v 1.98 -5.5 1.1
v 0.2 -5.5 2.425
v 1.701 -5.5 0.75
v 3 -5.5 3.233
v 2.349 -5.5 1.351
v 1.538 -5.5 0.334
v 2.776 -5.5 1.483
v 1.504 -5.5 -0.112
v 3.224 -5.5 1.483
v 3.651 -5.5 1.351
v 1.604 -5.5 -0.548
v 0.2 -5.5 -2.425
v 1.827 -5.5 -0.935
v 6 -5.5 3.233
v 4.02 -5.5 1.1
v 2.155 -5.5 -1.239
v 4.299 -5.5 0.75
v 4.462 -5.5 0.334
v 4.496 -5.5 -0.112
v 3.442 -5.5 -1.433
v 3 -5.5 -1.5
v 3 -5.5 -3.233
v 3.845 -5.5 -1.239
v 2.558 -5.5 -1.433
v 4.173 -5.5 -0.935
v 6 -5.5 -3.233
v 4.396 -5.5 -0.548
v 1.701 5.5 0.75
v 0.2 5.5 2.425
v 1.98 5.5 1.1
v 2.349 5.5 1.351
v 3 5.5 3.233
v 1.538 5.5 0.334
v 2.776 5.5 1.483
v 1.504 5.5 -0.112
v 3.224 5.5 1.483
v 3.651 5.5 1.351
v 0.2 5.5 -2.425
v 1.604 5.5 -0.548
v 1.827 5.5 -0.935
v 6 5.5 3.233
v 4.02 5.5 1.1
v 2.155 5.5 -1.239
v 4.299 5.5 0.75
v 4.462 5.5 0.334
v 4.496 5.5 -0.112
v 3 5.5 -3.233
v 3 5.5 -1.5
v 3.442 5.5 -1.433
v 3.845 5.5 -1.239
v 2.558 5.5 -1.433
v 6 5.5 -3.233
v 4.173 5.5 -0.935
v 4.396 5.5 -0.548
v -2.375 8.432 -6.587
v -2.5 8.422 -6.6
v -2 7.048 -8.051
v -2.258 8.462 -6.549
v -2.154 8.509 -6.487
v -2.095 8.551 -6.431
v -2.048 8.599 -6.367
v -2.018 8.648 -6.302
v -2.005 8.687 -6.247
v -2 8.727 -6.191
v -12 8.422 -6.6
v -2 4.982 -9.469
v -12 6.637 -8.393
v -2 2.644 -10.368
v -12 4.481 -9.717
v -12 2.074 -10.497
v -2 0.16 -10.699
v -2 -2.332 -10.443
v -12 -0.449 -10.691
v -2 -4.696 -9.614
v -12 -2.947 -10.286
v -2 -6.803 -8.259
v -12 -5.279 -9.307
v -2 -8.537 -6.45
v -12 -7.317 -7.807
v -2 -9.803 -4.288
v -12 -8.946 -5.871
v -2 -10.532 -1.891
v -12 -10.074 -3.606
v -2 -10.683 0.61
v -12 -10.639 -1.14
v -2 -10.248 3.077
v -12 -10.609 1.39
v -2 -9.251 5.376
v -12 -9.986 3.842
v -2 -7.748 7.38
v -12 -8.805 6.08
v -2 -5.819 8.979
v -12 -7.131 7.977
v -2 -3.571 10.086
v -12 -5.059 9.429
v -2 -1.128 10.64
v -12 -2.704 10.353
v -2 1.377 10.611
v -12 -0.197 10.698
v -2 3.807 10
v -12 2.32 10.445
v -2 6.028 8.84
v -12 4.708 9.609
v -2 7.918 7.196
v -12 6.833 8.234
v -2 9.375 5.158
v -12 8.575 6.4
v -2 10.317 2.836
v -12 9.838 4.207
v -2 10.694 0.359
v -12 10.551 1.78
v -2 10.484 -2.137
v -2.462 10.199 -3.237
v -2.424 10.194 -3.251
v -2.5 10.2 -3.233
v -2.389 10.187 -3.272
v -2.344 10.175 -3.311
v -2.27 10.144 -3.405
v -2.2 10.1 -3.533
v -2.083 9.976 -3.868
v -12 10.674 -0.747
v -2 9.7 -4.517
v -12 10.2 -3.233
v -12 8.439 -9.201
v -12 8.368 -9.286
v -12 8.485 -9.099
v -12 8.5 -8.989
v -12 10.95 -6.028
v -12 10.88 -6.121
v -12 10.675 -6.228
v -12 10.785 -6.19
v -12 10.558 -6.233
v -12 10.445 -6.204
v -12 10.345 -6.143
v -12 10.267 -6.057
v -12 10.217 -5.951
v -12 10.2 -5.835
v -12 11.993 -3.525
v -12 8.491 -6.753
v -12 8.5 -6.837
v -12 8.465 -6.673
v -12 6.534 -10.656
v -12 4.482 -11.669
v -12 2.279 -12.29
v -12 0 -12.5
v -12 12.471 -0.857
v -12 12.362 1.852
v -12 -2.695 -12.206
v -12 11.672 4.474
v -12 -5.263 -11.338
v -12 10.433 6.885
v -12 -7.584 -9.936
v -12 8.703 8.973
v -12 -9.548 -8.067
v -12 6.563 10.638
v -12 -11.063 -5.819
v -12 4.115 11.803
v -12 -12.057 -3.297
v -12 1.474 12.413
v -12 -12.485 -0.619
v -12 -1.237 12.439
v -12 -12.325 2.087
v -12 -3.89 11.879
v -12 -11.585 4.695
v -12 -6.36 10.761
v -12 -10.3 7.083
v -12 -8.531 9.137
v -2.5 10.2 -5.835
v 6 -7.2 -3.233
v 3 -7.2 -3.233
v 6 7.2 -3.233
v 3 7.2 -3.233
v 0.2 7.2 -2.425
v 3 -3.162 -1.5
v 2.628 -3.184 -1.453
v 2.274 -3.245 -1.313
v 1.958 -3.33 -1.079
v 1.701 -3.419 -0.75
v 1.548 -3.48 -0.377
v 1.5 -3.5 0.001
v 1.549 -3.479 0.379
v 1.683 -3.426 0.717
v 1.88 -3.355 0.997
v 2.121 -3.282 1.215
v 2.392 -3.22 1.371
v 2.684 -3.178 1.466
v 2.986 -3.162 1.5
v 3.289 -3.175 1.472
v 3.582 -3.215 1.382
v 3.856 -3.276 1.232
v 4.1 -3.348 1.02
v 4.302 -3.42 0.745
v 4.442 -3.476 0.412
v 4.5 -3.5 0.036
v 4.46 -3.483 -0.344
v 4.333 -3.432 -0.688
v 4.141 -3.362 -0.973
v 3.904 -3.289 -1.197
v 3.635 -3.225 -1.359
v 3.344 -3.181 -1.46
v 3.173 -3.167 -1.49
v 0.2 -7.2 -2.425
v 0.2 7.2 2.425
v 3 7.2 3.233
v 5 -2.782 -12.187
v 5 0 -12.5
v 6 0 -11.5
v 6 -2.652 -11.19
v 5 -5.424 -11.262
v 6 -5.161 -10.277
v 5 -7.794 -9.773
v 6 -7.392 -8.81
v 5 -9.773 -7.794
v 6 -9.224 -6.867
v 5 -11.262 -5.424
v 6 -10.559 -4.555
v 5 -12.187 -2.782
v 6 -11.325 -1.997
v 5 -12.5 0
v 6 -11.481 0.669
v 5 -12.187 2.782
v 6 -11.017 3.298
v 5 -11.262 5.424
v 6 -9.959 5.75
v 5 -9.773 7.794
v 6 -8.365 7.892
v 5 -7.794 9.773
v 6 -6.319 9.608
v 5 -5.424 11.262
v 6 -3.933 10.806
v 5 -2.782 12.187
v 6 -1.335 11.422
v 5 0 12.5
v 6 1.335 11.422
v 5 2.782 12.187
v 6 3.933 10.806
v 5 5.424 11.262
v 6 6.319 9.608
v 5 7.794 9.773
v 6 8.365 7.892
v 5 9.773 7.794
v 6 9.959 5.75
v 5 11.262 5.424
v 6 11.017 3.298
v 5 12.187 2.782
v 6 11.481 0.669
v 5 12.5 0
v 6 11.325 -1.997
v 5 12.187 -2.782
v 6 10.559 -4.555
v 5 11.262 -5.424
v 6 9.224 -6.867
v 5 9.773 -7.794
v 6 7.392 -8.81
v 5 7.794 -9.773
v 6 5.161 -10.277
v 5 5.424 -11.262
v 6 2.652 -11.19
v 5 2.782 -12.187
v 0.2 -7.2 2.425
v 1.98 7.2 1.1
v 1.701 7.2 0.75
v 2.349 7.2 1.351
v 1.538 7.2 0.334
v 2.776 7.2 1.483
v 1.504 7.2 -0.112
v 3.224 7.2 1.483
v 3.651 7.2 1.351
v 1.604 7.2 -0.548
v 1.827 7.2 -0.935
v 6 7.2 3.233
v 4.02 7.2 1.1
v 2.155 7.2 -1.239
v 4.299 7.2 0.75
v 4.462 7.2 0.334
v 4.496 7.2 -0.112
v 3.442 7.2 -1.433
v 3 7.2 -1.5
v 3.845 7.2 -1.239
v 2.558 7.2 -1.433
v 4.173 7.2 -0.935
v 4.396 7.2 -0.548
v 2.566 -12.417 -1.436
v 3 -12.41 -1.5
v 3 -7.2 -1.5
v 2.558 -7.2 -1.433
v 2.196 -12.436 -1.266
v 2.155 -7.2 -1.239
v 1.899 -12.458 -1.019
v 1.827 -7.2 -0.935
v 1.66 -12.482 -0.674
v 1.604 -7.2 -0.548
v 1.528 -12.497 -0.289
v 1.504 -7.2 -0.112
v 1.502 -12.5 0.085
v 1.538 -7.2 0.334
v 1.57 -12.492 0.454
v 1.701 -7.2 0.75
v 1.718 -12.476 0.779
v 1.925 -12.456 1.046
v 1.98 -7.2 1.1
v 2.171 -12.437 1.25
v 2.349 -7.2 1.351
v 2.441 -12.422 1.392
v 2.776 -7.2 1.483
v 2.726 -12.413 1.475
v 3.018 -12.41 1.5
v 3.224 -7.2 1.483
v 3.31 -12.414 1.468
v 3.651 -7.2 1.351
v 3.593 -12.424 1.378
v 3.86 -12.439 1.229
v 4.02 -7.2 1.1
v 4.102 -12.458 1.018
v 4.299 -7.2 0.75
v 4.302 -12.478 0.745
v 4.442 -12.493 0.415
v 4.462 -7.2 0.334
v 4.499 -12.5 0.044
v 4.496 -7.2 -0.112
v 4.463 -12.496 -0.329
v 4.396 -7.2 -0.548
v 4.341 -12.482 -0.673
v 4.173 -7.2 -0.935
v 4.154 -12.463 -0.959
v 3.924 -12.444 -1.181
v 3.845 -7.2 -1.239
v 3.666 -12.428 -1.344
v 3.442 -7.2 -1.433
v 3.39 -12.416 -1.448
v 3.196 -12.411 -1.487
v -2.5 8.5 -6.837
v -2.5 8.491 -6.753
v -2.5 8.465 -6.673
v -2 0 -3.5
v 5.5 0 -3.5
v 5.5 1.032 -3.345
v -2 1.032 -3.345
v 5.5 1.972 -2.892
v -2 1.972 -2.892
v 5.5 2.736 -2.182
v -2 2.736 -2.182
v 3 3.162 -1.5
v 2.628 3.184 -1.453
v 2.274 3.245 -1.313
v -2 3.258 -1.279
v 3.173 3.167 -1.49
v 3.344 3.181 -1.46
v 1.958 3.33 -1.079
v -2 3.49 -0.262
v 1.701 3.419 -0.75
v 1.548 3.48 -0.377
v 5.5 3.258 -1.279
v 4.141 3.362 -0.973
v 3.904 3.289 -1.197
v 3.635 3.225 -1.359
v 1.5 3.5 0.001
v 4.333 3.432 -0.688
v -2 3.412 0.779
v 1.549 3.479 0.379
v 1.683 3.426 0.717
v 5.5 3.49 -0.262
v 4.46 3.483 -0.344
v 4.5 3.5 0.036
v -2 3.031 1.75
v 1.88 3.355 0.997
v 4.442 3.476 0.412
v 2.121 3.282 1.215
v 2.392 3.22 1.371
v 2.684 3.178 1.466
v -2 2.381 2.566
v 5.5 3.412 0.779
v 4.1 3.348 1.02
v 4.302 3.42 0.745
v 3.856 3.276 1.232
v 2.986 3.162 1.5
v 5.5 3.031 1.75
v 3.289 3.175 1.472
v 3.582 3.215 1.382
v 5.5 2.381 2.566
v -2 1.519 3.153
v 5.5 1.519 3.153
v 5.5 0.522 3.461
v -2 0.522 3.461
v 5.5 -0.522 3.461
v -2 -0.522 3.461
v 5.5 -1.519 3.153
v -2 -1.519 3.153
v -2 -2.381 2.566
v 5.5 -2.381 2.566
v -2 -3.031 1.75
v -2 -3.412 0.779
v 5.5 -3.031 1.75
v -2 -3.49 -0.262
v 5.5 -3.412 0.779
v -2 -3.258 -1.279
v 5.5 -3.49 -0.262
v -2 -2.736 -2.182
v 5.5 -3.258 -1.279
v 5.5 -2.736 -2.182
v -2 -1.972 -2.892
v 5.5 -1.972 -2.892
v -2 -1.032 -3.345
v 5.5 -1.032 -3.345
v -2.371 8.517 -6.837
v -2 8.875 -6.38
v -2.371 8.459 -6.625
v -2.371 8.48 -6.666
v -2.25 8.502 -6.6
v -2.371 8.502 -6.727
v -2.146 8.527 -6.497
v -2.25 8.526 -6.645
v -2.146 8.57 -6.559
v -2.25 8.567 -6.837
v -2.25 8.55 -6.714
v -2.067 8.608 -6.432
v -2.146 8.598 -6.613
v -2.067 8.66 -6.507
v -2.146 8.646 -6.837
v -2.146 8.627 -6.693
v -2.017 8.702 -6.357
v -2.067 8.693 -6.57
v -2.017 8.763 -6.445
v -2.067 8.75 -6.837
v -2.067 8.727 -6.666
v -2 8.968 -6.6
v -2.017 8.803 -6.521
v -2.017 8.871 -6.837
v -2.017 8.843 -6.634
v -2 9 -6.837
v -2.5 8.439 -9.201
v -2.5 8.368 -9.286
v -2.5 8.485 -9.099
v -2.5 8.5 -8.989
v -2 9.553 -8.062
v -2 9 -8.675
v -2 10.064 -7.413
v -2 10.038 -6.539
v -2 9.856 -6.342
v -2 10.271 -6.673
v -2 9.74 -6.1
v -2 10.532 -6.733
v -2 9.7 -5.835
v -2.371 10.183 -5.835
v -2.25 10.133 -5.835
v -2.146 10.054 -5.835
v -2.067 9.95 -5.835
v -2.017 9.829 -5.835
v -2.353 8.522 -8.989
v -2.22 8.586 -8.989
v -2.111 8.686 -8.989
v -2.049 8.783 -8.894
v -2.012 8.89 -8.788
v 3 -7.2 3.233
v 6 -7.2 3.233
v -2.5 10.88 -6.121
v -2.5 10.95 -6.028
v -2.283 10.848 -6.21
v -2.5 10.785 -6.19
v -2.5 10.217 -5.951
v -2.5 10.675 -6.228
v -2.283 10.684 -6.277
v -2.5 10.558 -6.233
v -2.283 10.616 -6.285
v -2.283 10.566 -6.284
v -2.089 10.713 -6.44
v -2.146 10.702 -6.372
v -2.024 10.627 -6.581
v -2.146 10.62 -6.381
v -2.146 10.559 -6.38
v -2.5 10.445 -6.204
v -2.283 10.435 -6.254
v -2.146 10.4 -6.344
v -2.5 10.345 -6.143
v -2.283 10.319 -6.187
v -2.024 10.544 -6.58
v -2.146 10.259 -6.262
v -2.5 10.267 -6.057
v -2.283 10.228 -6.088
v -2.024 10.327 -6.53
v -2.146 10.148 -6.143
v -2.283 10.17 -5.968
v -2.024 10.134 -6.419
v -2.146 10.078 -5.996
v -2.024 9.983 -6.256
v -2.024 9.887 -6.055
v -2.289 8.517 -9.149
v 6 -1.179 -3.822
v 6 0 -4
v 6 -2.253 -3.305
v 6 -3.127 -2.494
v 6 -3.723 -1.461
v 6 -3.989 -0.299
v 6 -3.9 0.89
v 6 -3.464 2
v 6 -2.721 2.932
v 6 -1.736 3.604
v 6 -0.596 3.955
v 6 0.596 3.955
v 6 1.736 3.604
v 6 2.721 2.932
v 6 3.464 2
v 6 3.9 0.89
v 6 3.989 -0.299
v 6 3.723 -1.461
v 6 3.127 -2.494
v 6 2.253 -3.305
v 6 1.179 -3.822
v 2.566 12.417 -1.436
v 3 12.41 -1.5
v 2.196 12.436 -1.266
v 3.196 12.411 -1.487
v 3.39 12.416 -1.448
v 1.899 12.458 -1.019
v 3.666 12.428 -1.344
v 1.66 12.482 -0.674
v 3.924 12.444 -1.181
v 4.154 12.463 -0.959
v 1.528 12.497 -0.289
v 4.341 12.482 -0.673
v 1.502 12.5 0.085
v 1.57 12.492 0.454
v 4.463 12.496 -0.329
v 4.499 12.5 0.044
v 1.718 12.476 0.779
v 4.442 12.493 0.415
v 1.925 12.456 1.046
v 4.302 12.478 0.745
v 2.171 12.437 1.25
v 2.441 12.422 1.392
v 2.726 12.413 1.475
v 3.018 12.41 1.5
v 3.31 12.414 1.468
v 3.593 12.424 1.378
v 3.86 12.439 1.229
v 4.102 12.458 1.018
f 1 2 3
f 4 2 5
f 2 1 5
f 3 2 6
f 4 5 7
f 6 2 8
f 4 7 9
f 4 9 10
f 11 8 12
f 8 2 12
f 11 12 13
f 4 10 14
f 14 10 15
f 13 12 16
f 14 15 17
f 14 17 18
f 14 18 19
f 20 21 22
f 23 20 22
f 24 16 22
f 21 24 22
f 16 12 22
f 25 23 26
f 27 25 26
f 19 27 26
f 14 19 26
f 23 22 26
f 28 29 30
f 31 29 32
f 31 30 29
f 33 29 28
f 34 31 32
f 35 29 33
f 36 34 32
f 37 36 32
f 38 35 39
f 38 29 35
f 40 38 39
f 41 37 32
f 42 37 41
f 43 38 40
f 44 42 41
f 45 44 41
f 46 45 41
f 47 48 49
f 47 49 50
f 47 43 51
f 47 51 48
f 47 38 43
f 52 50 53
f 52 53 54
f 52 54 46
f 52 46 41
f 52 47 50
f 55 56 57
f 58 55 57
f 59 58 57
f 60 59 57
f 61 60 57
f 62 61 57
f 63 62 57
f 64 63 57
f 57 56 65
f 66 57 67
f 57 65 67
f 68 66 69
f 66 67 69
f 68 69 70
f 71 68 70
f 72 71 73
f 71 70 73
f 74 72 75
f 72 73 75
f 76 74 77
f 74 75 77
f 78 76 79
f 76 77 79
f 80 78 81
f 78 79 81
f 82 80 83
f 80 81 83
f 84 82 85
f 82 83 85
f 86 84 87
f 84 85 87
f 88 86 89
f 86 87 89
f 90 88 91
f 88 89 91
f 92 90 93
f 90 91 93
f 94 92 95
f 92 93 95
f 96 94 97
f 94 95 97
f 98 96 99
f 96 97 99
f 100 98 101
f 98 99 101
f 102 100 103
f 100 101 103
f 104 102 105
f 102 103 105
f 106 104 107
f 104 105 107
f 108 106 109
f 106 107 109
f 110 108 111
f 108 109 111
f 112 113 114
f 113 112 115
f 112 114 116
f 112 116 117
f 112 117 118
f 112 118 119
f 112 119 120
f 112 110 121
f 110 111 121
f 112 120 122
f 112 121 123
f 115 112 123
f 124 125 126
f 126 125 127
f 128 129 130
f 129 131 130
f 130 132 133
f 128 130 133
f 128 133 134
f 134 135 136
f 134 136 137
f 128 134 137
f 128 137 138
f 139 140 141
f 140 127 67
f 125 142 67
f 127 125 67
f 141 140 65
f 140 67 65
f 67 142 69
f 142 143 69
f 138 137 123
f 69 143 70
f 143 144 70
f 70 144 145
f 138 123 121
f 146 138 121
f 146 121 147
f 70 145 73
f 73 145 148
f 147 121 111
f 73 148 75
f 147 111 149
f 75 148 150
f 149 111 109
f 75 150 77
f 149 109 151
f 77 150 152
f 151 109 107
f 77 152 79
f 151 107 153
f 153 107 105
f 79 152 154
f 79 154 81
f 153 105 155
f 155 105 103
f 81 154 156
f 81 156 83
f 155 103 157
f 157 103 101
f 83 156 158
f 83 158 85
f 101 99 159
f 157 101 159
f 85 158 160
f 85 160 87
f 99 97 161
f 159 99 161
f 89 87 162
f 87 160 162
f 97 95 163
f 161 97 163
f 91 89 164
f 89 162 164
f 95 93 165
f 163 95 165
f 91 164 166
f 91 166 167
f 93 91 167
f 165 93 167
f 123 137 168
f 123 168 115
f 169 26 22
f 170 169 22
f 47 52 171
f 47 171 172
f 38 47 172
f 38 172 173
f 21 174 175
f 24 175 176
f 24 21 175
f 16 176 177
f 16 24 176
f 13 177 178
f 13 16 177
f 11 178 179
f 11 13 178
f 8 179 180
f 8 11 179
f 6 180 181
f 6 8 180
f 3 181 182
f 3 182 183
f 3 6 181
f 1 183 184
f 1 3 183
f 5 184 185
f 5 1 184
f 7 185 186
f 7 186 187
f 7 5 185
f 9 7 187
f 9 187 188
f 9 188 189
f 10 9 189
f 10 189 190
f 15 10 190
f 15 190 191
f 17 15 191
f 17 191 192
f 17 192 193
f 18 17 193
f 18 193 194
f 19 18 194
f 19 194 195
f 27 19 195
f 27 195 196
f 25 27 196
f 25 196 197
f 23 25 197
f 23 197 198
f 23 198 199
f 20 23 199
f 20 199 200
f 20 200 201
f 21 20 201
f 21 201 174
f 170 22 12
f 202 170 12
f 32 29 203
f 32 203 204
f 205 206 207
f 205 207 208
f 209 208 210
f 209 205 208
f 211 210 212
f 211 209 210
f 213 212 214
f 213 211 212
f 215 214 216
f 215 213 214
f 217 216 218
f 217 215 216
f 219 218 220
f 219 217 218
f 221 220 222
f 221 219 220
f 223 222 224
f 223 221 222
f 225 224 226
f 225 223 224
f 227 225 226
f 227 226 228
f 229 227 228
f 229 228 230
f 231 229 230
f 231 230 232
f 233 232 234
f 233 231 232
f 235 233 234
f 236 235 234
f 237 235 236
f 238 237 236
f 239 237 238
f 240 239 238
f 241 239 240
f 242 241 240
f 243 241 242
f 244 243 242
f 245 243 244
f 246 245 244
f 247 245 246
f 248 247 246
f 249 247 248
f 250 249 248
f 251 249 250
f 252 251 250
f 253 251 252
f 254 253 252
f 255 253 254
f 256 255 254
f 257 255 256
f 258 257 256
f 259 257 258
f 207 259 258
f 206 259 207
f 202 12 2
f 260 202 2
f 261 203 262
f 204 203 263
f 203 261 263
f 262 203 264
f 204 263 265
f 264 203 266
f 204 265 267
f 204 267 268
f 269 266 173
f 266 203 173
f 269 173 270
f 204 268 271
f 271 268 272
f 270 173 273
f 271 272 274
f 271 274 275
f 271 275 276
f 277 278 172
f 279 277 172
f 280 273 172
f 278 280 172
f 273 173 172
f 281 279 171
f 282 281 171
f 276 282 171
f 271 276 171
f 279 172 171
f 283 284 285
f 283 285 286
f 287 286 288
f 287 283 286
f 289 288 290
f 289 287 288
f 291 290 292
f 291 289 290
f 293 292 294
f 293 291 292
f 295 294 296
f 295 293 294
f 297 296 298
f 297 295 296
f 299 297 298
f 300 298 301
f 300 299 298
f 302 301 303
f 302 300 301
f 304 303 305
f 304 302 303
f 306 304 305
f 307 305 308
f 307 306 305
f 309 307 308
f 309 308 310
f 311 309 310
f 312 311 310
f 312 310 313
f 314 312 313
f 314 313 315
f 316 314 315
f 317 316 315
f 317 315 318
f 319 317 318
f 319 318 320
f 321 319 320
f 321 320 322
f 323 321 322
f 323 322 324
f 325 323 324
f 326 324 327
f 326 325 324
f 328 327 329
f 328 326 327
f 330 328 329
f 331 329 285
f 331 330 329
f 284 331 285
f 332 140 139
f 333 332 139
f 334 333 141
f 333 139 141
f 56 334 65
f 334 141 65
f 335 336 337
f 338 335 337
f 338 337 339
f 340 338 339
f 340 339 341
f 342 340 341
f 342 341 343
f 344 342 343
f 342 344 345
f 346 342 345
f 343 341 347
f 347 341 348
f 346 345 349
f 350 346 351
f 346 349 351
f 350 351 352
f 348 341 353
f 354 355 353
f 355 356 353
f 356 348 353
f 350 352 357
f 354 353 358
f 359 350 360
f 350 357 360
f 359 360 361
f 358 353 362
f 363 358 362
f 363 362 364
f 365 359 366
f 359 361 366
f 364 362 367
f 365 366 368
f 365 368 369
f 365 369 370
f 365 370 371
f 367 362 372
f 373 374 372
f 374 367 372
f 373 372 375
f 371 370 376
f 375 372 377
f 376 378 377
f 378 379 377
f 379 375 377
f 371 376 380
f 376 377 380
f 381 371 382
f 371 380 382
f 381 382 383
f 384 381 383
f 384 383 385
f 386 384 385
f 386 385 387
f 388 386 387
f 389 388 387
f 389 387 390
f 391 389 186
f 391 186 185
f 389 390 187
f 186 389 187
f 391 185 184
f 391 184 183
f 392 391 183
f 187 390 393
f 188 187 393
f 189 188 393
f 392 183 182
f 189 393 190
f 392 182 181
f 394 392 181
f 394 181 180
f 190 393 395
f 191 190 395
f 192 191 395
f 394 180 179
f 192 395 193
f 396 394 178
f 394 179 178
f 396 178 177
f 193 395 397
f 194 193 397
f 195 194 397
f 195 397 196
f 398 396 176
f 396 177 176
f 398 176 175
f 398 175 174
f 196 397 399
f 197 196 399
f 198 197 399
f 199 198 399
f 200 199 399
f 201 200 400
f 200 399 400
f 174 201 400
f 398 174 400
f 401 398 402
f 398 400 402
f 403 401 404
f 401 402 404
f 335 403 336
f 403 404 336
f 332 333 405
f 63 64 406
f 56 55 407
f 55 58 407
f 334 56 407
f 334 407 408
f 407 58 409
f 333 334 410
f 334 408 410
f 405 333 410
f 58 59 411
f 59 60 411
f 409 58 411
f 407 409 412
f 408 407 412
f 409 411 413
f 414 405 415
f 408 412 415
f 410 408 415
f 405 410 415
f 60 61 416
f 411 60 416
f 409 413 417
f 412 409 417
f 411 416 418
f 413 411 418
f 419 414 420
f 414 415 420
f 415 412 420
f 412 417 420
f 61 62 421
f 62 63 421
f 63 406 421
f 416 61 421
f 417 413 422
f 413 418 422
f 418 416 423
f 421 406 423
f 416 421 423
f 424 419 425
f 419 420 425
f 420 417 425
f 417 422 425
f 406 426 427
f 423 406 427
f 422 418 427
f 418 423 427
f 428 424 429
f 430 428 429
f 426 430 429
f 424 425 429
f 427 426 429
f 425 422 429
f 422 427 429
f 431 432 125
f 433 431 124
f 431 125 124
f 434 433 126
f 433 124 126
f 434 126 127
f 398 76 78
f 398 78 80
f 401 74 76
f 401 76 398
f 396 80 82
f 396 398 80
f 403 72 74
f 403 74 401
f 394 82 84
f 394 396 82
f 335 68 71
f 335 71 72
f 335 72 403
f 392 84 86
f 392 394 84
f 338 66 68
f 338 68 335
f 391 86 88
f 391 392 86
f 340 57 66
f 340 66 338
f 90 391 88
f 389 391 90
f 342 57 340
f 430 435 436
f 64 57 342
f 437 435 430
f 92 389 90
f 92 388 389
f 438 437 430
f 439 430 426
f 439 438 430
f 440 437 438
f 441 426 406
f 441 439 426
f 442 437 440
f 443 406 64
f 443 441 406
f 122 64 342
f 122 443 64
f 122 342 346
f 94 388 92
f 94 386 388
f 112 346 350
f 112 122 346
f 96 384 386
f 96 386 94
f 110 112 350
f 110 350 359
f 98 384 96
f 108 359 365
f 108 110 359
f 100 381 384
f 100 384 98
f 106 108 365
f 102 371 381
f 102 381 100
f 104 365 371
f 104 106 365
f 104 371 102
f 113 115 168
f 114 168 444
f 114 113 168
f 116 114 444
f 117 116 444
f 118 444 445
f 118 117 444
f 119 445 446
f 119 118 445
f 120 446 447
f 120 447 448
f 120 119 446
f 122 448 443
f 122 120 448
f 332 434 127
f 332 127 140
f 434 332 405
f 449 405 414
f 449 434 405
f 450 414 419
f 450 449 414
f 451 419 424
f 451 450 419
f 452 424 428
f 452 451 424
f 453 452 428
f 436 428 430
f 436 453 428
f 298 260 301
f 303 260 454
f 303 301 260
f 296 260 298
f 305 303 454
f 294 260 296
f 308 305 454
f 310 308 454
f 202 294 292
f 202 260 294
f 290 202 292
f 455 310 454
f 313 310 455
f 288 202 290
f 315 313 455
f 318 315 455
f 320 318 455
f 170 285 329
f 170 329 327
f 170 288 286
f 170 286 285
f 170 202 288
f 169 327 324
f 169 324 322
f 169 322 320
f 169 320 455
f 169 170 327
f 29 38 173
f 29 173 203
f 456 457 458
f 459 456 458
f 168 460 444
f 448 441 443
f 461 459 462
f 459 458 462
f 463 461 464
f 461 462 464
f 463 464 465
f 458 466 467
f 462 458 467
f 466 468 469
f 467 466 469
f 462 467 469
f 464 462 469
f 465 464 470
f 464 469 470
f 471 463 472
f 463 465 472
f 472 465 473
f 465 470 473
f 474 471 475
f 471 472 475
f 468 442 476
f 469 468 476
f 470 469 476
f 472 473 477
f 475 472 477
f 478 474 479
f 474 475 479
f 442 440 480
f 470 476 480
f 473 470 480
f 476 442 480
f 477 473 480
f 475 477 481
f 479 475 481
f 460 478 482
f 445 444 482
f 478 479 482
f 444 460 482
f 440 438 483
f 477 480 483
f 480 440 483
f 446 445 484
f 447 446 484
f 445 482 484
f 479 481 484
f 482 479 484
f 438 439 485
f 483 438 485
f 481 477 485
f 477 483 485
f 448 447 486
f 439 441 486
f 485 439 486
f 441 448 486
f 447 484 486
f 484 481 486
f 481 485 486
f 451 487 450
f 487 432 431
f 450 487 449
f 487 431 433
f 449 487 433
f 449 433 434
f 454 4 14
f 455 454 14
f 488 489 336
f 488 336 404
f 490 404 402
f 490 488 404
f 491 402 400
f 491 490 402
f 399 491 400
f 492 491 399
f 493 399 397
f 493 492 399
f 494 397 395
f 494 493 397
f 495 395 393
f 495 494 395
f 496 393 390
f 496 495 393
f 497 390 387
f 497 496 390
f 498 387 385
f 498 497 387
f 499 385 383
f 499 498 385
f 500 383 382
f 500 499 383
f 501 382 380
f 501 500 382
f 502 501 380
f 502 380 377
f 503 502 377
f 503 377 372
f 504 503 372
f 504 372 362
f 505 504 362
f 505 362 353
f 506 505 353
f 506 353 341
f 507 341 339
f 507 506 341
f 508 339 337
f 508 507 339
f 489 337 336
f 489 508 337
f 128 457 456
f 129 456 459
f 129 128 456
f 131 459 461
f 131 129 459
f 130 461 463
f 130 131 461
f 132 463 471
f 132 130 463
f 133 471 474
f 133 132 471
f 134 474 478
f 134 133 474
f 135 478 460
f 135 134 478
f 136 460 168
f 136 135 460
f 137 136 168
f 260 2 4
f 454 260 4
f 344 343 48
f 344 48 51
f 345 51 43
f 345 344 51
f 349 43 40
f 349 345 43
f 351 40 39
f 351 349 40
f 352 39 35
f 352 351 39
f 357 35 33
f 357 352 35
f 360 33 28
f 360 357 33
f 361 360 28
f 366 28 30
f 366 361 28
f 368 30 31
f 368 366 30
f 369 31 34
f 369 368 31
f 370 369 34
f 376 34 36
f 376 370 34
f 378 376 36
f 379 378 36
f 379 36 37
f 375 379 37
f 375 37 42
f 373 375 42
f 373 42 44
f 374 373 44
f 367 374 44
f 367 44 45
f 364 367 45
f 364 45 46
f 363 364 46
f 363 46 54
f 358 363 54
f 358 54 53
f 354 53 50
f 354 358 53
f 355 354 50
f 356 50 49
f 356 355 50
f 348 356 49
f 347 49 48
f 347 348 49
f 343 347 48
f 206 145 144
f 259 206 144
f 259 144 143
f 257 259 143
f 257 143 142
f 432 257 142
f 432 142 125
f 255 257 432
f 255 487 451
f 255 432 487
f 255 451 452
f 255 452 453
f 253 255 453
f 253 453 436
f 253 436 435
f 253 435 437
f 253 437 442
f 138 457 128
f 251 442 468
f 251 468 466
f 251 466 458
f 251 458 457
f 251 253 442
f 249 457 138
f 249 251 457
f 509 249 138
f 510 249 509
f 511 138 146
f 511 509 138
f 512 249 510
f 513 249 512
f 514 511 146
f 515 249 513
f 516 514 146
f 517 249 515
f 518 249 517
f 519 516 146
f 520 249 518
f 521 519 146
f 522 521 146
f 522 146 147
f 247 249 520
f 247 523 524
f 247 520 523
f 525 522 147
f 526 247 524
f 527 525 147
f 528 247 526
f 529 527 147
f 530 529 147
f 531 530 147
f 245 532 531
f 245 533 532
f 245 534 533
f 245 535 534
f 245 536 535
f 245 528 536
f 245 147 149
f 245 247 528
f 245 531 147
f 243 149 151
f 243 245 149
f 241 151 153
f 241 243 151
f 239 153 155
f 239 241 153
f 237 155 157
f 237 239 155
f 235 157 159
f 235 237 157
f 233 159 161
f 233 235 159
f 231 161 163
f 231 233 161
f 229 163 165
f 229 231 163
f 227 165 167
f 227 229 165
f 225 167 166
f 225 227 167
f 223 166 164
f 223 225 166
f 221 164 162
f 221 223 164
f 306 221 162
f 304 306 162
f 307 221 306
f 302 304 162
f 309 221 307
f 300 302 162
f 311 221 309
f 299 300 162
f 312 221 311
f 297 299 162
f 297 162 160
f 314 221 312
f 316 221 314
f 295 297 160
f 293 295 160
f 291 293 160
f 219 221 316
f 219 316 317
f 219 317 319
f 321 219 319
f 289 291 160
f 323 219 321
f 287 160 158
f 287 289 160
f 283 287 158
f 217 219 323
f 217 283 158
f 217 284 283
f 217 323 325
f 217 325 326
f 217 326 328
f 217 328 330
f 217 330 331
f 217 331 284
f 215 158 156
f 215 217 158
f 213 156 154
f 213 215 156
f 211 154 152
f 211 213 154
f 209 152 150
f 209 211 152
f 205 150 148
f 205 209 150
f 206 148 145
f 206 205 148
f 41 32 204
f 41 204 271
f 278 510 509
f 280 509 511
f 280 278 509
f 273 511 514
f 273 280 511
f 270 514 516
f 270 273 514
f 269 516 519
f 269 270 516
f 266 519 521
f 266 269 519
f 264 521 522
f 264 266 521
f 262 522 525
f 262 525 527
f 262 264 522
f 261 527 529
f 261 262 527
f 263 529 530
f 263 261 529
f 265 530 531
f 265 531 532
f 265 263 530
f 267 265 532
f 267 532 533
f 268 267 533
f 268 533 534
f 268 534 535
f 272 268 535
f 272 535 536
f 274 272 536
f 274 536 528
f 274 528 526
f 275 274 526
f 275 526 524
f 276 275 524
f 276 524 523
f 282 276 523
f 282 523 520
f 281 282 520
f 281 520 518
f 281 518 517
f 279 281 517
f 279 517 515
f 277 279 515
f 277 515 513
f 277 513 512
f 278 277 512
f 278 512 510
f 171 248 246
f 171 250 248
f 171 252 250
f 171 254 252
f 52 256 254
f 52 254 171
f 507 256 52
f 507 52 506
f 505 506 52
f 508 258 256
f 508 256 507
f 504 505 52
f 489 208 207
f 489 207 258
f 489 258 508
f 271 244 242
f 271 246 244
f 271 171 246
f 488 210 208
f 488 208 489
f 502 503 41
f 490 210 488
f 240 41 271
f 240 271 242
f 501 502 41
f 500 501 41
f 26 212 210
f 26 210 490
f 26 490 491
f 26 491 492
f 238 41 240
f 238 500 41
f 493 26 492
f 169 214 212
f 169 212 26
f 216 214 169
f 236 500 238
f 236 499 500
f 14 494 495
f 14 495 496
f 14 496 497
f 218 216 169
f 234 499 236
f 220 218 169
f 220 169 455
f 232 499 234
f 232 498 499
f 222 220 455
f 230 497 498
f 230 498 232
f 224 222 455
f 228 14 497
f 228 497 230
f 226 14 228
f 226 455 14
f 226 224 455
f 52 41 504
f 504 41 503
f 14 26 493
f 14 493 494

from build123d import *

# Parameters (mm, degrees)
CUT_EXTRUDE1_DEPTH       = 22.365860619
CUT_EXTRUDE1_DEPTH_BACK  = 22.365860619
SKETCH2_R                = 1.5
SKETCH3_W                = 9.16515139
SKETCH3_H                = 1.7
CUT_EXTRUDE2_DEPTH       = 21.310096204
FILLET1_R                = 0.4
BOSS_EXTRUDE1_START      = 19.2405
SKETCH4_R                = 6.5
SKETCH4_R_2              = 3
BOSS_EXTRUDE1_DEPTH      = 19.2405
CHAMFER1_SIZE            = 1.5
CHAMFER2_SIZE            = 0.5
FILLET2_R                = 0.5
CUT_EXTRUDE3_START       = -19.2405
CUT_EXTRUDE3_OUTLINE_R   = 7.963373885
CUT_EXTRUDE3_OUTLINE_R_2 = 3
CUT_EXTRUDE3_DEPTH       = 19.2405
SKETCH6_R                = 3.5
CUT_EXTRUDE4_DEPTH       = 10
CHAMFER3_SIZE            = 0.5
SKETCH7_R                = 10.7
CUT_EXTRUDE5_DEPTH       = 10
CUT_EXTRUDE6_START       = 5.5
CUT_EXTRUDE6_DEPTH       = 1.7
CHAMFER5_SIZE            = 1


# Read off the part's stored shape, not the designer's step: Cut-Extrude3
with BuildPart() as part:
    # Sketch1 → Revolve1 (revolve)
    with BuildSketch(Plane.XY, mode=Mode.PRIVATE) as revolve1_sk:
        Polygon((-12, 12.5), (0, 12.5), (6, 12.5), (6, 10), (6, 3), (-2, 3), (-2, 10.2), (-12, 10.2), align=None)
    revolve(revolve1_sk.sketch.rotate(Axis((88.99, 0, 0), (-1, 0, 0)), 90), axis=Axis((88.99, 0, 0), (-1, 0, 0)))

    # Sketch2 → Cut-Extrude1 (cut, two sides: drawn at the far end of the back side and taken through both)
    with BuildSketch(Plane(origin=(0, 0, 0), x_dir=(1, 0, 0), z_dir=(0, 1, 0)).offset(-CUT_EXTRUDE1_DEPTH_BACK)):
        with Locations(Location((3, 0, 0), (0, 0, 90))):
            Circle(SKETCH2_R)
    extrude(amount=CUT_EXTRUDE1_DEPTH + CUT_EXTRUDE1_DEPTH_BACK, mode=Mode.SUBTRACT)

    # Sketch3 → Cut-Extrude2 (cut, through all)
    with BuildSketch(Plane.ZY.offset(2)):
        with Locations((-4.582575695, 9.35)):
            Rectangle(SKETCH3_W, SKETCH3_H)
    extrude(amount=CUT_EXTRUDE2_DEPTH, mode=Mode.SUBTRACT)

    # Fillet1
    fillet1_edges = [part.edges().sort_by_distance(p)[0] for p in [
        (-7, 8.5, -5.638262144),
        (-7, 10.2, -7.22564876),
        (-7, 8.5, -9.16515139),
    ]]
    fillet(fillet1_edges, radius=FILLET1_R)

    # Sketch4 → Boss-Extrude1 (add)
    with BuildSketch(Plane.ZY.offset(2).offset(BOSS_EXTRUDE1_START)):
        Circle(SKETCH4_R)
        with Locations(Location((0, 0, 0), (0, 0, 180))):
            Circle(SKETCH4_R_2, mode=Mode.SUBTRACT)
    extrude(amount=-BOSS_EXTRUDE1_DEPTH)

    # Chamfer1
    chamfer1_edges = [part.edges().sort_by_distance(p)[0] for p in [
        (-21.2405, 0, -6.5),
        (-21.2405, 0, 3),
    ]]
    chamfer(chamfer1_edges, length=CHAMFER1_SIZE)

    # Chamfer2
    chamfer2_edges = [part.edges().sort_by_distance(p)[0] for p in [
        (6, 0, 3),
    ]]
    chamfer(chamfer2_edges, length=CHAMFER2_SIZE)

    # Fillet2
    # the kernel refuses this fillet: 0.5 mm, written as the material it adds along each edge
    with BuildSketch(Plane(origin=(-2, 0, 0), x_dir=(0, 0.7641509433962261, -0.6450374684517619), z_dir=(0, 0.6450374684517619, 0.7641509433962261))) as fillet2_piece_1:
        with BuildLine():
            CenterArc((10.2 - FILLET2_R, FILLET2_R), FILLET2_R, 270, 90)
            Line((10.2, FILLET2_R), (10.2, 0))
            Line((10.2, 0), (10.2 - FILLET2_R, 0))
        make_face()
    revolve(axis=Axis((-2, 0, 0), (-1, 0, 0)), revolution_arc=319.831515217)
    with BuildSketch(Plane(origin=(-2, 10.2, 0), x_dir=(0, -1, 0), z_dir=(0, 0, -1))) as fillet2_piece_2:
        with BuildLine():
            CenterArc((FILLET2_R, FILLET2_R), FILLET2_R, 180, 90)
            Line((0, FILLET2_R), (0, 0))
            Line((0, 0), (FILLET2_R, 0))
        make_face()
    extrude(amount=5.835237784)
    with BuildSketch(Plane(origin=(-2, 8.5, -8.988882022), x_dir=(0, 1, 0), z_dir=(0, 0, 1))) as fillet2_piece_3_section:
        with BuildLine():
            CenterArc((FILLET2_R, FILLET2_R), FILLET2_R, 180, 90)
            Line((0, FILLET2_R), (0, 0))
            Line((0, 0), (FILLET2_R, 0))
        make_face()
    fillet2_piece_3 = extrude(amount=2.151484856, mode=Mode.PRIVATE)
    fillet2_piece_3 = fillet2_piece_3 & Plane(origin=(-2.112337318, 0, 0), x_dir=(0, 0, -1), z_dir=(1, 0, 0)) * Cylinder(12.5, 7, mode=Mode.PRIVATE)
    add(fillet2_piece_3)
    with BuildSketch(Plane(origin=(-2, 8.1, -6.837397166), x_dir=(0, -0.7641509433962268, 0.6450374684517612), z_dir=(0, -0.6450374684517612, -0.7641509433962268))) as fillet2_piece_4:
        with BuildLine():
            CenterArc((0.4 + FILLET2_R, FILLET2_R), FILLET2_R, 180, 90)
            Line((0.4, FILLET2_R), (0.4, 0))
            Line((0.4, 0), (0.4 + FILLET2_R, 0))
        make_face()
    revolve(axis=Axis((-2, 8.1, -6.837397166), (-1, 0, 0)), revolution_arc=139.831515217)
    with BuildSketch(Plane(origin=(-2, 8.1, -8.988882022), x_dir=(0, -0.6813941617388248, 0.7319166594280009), z_dir=(0, 0.7319166594280009, 0.6813941617388248))) as fillet2_piece_5_section:
        with BuildLine():
            CenterArc((0.4 + FILLET2_R, -FILLET2_R), FILLET2_R, 90, 90)
            Line((0.4, -FILLET2_R), (0.4, 0))
            Line((0.4, 0), (0.4 + FILLET2_R, 0))
        make_face()
    fillet2_piece_5 = revolve(axis=Axis((-2, 8.1, -8.988882022), (1, 0, 0)), revolution_arc=227.047315948, mode=Mode.PRIVATE)
    fillet2_piece_5 = fillet2_piece_5 & Plane(origin=(-2.20433756, 0, 0), x_dir=(0, 0, -1), z_dir=(1, 0, 0)) * Cylinder(12.5, 4, mode=Mode.PRIVATE)
    add(fillet2_piece_5)
    with BuildSketch(Plane(origin=(-2, 10.6, -5.835237784), x_dir=(0, -0.8696656127523182, 0.49364128878785535), z_dir=(0, -0.49364128878785535, -0.8696656127523182))) as fillet2_piece_6_section:
        with BuildLine():
            CenterArc((0.4 + FILLET2_R, FILLET2_R), FILLET2_R, 180, 90)
            Line((0.4 + FILLET2_R, 0), (0.4, 0))
            Line((0.4, 0), (0.4, FILLET2_R))
        make_face()
    fillet2_piece_6 = revolve(axis=Axis((-2, 10.6, -5.835237784), (-1, 0, 0)), revolution_arc=330.419804772, mode=Mode.PRIVATE)
    fillet2_piece_6 = fillet2_piece_6 & Plane(origin=(-2.048284791, 0, 0), x_dir=(0, 0, -1), z_dir=(1, 0, 0)) * Cylinder(12.5, 4, mode=Mode.PRIVATE)
    add(fillet2_piece_6)
    with BuildSketch(Plane(origin=(-2, 0, 0), x_dir=(0, 0, 1), z_dir=(0, -1, 0))) as fillet2_piece_7:
        with BuildLine():
            CenterArc((6.5 + FILLET2_R, FILLET2_R), FILLET2_R, 180, 90)
            Line((6.5, FILLET2_R), (6.5, 0))
            Line((6.5, 0), (6.5 + FILLET2_R, 0))
        make_face()
    revolve(axis=Axis((-2, 0, 0), (-1, 0, 0)))

    # Cut-Extrude3 outline → Cut-Extrude3 (cut)
    with BuildSketch(Plane.ZY.offset(21.2405).offset(CUT_EXTRUDE3_START)):
        Circle(CUT_EXTRUDE3_OUTLINE_R)
        Circle(CUT_EXTRUDE3_OUTLINE_R_2, mode=Mode.SUBTRACT)
    extrude(amount=CUT_EXTRUDE3_DEPTH, mode=Mode.SUBTRACT)

    # Sketch6 → Cut-Extrude4 (cut)
    with BuildSketch(Plane(origin=(6, 0, 0), x_dir=(0, 0, -1), z_dir=(1, 0, 0))):
        Circle(SKETCH6_R)
    extrude(amount=-CUT_EXTRUDE4_DEPTH, mode=Mode.SUBTRACT)

    # Chamfer3
    chamfer3_edges = [part.edges().sort_by_distance(p)[0] for p in [
        (6, 0, 3.5),
    ]]
    chamfer(chamfer3_edges, length=CHAMFER3_SIZE)

    # Sketch7 → Cut-Extrude5 (cut)
    with BuildSketch(Plane.ZY.offset(12)):
        Circle(SKETCH7_R)
    extrude(amount=-CUT_EXTRUDE5_DEPTH, mode=Mode.SUBTRACT)

    # Sketch8 → Cut-Extrude6 (cut)
    with BuildSketch(Plane(origin=(0, 0, 0), x_dir=(1, 0, 0), z_dir=(0, 1, 0)).offset(CUT_EXTRUDE6_START)):
        Polygon((0.2, 1.616580754), (0.2, -1.616580754), (0.2, -2.424871131), (3, -3.233161507), (4.318553482, -3.233161507), (8.377038533, -3.233161507), (8.377038533, 3.233161507), (4.318553482, 3.233161507), (3, 3.233161507), (0.2, 2.424871131), align=None)
    cut_extrude6 = extrude(amount=CUT_EXTRUDE6_DEPTH, mode=Mode.SUBTRACT)

    # Chamfer5
    chamfer5_edges = [part.edges().sort_by_distance(p)[0] for p in [
        (6, 0, 12.5),
    ]]
    chamfer(chamfer5_edges, length=CHAMFER5_SIZE)

    # Mirror1: Cut-Extrude6 across plane
    add(cut_extrude6.mirror(Plane.ZX), mode=Mode.SUBTRACT)


solid = part.part
